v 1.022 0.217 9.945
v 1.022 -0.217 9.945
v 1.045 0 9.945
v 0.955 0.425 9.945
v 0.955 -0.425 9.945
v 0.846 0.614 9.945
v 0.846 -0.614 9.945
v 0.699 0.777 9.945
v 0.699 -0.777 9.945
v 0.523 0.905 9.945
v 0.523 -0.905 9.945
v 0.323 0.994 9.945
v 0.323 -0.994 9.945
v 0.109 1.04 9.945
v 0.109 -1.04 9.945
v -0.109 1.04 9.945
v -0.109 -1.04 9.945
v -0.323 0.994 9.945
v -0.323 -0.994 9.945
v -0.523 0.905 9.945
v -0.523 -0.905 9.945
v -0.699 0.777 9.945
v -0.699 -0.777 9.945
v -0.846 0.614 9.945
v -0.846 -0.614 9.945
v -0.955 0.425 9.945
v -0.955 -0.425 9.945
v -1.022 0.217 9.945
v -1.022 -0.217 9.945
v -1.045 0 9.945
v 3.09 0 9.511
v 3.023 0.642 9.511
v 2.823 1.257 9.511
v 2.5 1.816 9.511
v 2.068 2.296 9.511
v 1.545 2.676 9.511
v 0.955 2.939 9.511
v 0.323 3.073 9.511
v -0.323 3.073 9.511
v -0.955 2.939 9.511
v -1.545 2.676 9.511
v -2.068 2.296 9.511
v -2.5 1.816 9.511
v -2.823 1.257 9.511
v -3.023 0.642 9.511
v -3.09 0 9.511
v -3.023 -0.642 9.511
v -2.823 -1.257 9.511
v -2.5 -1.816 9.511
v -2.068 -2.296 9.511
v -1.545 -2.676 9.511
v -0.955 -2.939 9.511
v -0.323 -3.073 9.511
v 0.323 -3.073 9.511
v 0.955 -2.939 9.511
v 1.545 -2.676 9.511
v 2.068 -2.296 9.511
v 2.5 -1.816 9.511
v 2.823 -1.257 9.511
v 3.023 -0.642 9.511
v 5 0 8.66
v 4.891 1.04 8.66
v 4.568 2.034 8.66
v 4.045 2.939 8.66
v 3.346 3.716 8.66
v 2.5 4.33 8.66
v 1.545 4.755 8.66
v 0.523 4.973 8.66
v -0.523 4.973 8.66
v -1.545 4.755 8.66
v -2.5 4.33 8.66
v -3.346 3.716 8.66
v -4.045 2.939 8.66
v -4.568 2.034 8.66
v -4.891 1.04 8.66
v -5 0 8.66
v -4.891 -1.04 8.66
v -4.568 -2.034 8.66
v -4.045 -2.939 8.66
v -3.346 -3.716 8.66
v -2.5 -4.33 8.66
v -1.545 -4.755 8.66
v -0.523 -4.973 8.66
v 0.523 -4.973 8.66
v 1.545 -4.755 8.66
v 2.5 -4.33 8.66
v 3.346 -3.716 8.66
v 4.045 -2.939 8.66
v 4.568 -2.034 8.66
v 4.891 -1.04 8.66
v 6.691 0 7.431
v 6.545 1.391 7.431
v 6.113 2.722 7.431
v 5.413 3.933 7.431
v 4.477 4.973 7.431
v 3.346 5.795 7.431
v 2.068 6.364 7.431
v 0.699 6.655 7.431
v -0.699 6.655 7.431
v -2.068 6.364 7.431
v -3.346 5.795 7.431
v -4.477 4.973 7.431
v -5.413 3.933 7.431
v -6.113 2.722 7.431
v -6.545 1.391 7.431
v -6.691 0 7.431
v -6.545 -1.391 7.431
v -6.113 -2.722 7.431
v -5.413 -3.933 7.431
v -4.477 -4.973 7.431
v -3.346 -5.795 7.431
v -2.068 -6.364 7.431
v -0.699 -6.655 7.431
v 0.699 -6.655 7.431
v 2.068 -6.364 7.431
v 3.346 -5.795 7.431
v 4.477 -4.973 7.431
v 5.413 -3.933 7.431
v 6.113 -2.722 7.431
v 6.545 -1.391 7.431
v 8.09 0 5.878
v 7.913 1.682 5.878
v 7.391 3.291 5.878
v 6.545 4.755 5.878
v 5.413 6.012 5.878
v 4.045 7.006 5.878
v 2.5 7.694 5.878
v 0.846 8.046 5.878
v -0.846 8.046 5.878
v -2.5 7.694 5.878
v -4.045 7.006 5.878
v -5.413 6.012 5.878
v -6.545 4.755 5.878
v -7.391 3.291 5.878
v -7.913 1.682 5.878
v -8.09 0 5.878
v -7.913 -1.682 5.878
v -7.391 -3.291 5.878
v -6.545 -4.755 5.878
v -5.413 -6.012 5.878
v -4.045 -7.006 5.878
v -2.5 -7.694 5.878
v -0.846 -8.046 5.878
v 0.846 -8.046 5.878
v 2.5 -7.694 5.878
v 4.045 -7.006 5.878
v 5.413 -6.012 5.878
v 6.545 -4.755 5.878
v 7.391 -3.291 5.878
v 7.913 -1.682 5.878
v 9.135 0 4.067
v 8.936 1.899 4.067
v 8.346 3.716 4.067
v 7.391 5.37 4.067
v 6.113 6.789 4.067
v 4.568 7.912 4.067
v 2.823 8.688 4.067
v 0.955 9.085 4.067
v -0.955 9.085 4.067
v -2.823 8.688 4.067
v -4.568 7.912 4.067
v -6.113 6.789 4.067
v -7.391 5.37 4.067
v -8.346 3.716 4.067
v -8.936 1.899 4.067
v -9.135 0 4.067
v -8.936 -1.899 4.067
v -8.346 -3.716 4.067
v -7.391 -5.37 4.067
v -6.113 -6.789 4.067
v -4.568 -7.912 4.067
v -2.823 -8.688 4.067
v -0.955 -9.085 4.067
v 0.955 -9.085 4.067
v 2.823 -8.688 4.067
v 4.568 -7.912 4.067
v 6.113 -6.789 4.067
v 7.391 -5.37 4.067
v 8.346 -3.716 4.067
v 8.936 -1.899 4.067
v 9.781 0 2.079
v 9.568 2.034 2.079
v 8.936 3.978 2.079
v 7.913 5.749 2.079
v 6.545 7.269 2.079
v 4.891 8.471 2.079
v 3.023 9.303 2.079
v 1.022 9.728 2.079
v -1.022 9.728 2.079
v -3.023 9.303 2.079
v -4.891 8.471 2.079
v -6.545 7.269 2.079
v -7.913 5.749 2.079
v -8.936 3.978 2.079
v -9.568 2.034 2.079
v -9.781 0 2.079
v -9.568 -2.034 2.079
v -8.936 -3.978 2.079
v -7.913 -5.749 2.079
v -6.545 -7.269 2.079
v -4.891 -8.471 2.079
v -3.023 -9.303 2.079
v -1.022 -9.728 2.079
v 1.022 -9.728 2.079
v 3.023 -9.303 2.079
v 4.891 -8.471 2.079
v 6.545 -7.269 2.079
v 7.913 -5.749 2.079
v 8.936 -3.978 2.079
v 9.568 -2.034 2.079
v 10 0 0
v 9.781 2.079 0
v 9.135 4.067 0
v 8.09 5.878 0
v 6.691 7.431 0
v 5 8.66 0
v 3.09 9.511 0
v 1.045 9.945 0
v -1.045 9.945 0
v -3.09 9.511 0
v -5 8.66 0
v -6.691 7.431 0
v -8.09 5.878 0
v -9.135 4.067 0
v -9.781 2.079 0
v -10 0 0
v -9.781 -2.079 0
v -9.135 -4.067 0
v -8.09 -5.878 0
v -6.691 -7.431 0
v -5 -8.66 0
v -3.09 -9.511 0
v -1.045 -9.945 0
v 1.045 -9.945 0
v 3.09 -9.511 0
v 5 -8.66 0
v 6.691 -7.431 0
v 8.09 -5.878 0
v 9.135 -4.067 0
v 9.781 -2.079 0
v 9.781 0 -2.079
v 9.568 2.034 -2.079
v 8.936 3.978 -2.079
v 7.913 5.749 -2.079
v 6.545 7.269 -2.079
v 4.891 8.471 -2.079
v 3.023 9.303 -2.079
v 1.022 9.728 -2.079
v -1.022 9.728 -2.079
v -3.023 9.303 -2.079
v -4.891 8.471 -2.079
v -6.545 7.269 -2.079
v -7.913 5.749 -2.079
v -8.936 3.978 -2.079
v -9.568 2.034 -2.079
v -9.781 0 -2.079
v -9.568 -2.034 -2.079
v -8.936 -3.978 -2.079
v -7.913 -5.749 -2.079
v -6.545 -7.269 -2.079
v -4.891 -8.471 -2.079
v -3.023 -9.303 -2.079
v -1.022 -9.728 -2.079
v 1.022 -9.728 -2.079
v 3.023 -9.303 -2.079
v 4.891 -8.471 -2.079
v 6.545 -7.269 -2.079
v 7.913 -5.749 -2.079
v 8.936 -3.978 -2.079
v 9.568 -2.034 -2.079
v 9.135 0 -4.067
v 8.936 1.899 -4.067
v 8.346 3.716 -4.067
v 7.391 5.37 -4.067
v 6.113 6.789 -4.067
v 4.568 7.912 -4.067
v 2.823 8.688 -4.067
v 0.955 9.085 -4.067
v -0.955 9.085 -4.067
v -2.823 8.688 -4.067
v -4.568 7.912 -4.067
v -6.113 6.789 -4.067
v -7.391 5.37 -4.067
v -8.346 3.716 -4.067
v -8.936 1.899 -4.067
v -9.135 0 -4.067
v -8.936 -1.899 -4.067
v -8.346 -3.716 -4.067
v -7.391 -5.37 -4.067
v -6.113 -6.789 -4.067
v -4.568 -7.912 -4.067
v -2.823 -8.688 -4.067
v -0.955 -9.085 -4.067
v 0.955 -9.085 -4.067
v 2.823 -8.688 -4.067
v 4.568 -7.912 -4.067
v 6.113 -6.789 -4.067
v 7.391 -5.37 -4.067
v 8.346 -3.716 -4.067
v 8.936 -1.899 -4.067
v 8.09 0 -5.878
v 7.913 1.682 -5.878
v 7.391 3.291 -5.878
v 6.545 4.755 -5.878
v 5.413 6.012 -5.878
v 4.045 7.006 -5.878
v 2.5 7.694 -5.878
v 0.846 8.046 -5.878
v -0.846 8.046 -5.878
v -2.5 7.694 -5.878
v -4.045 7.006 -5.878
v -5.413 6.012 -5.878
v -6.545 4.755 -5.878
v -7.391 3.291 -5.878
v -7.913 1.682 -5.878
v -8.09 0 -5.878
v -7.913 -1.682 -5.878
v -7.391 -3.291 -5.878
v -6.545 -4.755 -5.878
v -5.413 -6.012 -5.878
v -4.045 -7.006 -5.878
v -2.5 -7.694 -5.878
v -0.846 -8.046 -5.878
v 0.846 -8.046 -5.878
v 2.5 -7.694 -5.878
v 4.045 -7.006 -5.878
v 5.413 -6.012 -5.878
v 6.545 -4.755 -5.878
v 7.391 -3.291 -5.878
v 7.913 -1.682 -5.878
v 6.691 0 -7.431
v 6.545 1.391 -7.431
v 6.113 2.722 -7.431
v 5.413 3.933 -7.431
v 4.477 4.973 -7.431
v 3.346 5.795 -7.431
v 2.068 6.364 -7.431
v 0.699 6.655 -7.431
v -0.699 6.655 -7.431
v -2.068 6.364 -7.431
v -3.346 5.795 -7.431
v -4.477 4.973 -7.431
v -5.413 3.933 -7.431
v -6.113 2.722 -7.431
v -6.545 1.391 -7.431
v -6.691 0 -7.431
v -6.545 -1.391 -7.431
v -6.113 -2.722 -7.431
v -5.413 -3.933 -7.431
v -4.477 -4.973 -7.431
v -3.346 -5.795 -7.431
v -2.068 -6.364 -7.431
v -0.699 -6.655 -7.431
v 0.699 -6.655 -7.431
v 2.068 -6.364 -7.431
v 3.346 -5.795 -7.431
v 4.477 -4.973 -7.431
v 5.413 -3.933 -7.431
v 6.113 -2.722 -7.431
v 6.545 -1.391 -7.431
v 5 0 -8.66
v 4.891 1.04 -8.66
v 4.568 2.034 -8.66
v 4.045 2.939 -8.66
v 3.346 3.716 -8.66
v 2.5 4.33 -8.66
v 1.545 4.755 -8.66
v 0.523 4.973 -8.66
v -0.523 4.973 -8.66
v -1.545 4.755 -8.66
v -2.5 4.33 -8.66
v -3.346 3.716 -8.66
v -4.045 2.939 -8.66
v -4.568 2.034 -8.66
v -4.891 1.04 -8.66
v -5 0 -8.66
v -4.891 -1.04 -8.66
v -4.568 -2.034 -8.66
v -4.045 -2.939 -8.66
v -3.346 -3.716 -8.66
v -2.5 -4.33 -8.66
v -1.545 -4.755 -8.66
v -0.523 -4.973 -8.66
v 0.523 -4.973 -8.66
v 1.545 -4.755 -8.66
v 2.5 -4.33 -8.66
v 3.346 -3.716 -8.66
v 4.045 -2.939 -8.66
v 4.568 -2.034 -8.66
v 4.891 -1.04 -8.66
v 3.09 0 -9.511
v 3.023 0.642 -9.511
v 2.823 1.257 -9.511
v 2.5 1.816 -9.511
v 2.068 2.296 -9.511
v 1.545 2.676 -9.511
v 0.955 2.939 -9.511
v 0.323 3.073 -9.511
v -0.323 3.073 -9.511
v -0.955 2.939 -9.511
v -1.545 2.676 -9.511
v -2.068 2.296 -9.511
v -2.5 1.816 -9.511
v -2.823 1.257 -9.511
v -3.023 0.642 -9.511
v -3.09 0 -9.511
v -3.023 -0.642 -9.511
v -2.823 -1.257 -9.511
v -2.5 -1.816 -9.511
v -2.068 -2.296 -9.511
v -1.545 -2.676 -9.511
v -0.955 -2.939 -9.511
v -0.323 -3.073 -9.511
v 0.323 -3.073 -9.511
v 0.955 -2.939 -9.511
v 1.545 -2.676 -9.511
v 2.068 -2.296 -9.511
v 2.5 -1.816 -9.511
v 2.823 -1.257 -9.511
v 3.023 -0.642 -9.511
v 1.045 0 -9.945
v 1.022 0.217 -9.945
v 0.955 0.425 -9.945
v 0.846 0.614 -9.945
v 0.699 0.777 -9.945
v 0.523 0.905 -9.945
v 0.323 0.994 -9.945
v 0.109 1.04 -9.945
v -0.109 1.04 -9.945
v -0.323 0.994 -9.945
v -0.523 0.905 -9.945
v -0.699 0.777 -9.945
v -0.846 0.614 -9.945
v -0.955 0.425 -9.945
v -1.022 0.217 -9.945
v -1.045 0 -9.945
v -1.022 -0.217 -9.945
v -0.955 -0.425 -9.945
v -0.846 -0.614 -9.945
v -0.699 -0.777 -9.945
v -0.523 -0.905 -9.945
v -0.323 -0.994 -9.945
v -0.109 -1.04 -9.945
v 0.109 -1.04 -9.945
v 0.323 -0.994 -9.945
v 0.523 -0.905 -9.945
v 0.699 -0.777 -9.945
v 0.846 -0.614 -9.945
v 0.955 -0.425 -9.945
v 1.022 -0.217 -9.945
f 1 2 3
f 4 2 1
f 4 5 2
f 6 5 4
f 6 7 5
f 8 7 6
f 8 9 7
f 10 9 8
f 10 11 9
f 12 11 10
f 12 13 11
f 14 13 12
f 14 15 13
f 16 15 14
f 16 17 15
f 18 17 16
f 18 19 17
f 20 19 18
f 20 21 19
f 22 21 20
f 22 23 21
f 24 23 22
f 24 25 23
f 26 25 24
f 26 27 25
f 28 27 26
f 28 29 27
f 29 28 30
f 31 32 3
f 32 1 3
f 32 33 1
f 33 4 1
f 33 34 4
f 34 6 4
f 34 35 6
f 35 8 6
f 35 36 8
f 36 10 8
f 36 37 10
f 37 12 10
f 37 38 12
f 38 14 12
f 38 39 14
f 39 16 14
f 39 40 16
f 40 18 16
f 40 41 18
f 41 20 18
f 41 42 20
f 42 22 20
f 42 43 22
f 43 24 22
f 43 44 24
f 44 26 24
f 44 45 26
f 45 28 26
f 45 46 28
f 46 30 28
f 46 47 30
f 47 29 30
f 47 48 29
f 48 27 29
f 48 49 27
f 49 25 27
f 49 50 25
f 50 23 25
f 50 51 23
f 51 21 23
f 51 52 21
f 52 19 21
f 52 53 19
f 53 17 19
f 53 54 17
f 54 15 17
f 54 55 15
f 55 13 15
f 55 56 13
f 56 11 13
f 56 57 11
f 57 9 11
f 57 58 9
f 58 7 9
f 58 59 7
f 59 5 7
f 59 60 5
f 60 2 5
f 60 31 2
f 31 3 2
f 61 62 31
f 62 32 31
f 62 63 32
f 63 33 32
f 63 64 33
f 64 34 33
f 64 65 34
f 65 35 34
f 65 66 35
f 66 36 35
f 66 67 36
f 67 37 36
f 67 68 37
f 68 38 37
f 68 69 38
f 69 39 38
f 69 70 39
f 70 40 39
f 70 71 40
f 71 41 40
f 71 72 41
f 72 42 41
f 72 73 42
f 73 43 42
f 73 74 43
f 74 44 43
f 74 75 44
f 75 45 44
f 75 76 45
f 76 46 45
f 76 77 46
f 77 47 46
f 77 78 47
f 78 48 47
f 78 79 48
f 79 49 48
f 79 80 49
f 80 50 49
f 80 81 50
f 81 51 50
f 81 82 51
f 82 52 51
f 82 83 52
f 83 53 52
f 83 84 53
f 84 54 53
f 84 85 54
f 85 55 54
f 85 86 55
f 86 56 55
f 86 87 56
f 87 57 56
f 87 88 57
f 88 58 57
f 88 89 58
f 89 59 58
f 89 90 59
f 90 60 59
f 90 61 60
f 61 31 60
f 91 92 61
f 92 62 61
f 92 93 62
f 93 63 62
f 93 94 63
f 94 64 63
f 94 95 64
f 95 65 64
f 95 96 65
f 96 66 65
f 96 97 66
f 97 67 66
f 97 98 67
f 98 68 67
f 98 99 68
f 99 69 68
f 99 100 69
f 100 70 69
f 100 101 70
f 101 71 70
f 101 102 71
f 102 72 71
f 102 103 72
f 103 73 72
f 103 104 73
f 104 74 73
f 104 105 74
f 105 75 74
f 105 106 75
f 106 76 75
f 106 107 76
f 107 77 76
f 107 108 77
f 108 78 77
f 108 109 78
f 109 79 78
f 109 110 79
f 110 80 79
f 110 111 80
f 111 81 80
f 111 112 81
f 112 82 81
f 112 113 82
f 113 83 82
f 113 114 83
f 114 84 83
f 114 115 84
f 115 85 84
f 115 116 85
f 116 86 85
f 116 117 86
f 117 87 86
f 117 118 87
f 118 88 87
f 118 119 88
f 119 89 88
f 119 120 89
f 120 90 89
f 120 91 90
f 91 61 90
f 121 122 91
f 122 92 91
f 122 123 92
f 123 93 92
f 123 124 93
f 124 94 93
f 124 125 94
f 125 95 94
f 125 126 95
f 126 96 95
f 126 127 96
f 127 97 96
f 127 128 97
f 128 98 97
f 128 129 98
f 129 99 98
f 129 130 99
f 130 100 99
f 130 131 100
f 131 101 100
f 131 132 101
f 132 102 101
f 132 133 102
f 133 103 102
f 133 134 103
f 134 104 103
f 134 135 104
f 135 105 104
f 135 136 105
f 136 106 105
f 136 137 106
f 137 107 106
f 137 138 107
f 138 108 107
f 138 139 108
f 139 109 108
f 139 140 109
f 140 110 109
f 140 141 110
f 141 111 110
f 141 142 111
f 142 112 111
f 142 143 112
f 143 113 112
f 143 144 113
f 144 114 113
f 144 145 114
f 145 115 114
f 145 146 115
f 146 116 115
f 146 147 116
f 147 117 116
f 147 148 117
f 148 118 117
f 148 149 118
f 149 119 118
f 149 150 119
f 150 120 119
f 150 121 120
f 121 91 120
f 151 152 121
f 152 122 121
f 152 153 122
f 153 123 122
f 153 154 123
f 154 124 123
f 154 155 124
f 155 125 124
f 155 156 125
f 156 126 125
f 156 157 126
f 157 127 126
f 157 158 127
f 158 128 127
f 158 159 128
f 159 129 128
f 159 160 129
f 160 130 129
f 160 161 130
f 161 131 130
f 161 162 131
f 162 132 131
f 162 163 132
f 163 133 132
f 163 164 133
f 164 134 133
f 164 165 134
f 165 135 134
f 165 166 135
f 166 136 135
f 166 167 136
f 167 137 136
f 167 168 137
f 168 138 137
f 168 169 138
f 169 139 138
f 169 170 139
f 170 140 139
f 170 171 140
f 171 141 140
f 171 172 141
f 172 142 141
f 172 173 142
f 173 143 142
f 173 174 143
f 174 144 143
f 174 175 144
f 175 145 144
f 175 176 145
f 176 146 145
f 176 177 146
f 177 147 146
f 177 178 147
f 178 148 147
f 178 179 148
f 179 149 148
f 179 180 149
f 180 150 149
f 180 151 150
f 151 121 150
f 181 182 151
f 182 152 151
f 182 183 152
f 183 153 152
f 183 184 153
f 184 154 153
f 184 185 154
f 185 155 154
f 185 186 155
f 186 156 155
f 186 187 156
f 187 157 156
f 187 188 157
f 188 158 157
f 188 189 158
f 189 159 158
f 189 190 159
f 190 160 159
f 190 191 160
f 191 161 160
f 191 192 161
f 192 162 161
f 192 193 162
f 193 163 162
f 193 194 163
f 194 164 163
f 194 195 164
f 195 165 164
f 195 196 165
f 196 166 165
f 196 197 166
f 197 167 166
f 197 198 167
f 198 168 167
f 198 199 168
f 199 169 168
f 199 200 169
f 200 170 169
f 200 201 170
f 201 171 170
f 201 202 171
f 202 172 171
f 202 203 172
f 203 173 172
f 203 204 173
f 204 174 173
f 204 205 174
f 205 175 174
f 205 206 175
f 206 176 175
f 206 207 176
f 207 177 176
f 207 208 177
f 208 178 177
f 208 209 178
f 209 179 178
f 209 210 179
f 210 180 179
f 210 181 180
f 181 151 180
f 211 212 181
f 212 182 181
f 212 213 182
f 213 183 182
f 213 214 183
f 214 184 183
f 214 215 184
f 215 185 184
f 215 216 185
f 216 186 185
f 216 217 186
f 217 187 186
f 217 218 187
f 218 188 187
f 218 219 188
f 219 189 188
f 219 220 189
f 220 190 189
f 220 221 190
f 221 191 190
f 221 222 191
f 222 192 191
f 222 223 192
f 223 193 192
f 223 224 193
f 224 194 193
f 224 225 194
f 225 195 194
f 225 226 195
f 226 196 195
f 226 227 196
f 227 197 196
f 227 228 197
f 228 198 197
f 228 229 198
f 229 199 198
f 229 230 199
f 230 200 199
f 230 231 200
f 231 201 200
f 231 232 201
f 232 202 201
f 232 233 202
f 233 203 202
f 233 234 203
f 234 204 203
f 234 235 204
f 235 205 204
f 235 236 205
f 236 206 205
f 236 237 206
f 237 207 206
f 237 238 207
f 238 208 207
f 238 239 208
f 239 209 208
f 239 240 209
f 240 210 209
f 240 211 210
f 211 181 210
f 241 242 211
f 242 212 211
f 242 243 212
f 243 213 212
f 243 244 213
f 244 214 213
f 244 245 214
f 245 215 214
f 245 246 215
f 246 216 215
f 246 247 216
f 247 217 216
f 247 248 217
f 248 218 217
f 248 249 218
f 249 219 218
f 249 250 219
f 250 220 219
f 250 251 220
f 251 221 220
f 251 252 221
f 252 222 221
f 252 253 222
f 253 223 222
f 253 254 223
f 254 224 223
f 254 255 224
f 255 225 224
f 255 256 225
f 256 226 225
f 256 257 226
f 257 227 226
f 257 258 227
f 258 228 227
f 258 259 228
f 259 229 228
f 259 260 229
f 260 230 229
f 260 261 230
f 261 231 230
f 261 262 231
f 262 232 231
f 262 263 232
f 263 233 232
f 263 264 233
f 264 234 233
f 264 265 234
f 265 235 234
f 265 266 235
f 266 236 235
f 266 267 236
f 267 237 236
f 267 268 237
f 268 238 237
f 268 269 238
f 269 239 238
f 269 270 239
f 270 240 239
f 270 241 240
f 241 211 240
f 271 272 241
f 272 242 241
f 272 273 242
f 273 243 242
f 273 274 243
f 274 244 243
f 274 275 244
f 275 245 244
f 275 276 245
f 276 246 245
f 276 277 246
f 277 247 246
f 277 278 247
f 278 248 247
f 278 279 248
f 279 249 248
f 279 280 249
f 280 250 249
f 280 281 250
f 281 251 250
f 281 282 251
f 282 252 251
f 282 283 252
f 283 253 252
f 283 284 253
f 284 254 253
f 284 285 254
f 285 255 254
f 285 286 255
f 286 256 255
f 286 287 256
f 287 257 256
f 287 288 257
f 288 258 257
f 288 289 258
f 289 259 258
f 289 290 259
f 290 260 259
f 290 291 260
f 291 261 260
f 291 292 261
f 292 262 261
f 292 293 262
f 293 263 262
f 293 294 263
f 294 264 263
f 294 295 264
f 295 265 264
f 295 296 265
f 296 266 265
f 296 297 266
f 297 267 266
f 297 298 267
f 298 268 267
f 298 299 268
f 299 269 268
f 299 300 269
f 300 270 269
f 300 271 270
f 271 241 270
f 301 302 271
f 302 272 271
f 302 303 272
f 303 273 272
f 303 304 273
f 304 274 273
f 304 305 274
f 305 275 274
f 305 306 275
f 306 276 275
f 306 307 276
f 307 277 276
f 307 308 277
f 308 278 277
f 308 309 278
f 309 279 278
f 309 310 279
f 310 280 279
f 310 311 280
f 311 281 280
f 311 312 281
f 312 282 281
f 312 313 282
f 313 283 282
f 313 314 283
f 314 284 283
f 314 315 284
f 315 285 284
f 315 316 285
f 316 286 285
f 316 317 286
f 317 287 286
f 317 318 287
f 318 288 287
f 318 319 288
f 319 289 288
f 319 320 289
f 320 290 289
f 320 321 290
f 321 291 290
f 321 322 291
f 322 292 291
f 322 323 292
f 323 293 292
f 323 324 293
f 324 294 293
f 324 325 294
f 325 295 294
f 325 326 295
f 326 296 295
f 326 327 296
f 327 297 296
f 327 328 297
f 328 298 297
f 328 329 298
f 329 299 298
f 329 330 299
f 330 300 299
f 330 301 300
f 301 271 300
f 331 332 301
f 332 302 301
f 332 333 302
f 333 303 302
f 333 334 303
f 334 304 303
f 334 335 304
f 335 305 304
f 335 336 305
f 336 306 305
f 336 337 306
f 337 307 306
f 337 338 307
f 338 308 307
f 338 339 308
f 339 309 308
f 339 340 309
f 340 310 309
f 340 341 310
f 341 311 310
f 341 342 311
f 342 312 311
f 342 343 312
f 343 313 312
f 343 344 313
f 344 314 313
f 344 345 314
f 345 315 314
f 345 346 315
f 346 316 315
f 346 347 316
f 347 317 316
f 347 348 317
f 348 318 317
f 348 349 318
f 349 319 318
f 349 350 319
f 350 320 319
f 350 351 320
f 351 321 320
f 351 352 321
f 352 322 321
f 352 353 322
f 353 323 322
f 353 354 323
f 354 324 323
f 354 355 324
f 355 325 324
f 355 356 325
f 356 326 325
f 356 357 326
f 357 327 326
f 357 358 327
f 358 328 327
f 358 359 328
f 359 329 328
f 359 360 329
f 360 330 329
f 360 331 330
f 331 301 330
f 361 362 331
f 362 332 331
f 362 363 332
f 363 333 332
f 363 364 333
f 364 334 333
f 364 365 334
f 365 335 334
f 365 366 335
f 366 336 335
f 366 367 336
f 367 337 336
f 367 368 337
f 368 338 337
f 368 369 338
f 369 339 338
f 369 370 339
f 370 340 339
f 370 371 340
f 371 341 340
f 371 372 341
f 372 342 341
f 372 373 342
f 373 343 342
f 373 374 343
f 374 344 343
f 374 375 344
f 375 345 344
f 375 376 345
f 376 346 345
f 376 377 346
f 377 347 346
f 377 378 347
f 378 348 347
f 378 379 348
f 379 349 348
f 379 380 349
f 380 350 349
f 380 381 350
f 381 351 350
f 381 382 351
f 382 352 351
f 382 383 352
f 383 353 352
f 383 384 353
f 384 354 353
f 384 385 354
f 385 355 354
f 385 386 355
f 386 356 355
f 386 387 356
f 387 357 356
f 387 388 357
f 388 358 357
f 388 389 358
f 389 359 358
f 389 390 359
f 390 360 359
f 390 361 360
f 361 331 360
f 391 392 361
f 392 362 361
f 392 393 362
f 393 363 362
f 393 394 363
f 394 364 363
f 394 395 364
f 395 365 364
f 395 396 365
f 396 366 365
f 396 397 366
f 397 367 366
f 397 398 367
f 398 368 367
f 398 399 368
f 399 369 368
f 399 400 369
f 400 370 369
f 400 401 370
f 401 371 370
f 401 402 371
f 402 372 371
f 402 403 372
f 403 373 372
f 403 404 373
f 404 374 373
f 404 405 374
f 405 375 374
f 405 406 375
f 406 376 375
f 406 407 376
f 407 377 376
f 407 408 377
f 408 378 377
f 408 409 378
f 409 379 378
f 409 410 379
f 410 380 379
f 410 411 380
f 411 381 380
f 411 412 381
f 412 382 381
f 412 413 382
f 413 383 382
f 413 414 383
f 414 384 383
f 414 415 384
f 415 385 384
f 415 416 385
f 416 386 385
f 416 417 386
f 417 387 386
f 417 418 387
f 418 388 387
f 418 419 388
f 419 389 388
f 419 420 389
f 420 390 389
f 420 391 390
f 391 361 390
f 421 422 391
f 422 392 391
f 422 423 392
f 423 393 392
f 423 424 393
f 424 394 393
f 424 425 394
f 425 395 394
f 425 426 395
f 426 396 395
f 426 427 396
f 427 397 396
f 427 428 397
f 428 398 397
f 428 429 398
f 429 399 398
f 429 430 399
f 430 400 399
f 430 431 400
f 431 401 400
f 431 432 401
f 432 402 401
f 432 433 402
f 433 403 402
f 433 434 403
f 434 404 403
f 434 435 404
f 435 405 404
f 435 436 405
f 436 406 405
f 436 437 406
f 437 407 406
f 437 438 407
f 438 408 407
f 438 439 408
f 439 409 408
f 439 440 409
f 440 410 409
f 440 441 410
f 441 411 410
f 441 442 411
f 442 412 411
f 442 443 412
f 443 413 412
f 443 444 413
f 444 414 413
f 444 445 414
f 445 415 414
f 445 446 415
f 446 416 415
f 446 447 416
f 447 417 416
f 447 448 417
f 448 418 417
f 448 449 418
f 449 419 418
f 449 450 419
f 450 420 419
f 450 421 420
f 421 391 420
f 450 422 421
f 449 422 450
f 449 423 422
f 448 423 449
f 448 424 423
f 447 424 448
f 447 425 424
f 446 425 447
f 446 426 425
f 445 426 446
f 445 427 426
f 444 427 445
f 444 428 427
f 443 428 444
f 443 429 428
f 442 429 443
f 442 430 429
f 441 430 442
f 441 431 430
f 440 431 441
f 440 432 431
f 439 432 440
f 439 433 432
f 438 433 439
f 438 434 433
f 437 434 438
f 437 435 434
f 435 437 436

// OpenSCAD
// This indicates the in-plane
// joint-primitive constraint.
//
// Here we have a case where a point on
// the red component must be found
// on a plane in the green component.

color("red", 0.5){
translate([0,0,0])
  rotate([0,0,0])
    sphere(10);
}

color("green", 0.5){
translate([0,0,0])
  rotate([0,0,0])
    square([300, 300], true);
}
